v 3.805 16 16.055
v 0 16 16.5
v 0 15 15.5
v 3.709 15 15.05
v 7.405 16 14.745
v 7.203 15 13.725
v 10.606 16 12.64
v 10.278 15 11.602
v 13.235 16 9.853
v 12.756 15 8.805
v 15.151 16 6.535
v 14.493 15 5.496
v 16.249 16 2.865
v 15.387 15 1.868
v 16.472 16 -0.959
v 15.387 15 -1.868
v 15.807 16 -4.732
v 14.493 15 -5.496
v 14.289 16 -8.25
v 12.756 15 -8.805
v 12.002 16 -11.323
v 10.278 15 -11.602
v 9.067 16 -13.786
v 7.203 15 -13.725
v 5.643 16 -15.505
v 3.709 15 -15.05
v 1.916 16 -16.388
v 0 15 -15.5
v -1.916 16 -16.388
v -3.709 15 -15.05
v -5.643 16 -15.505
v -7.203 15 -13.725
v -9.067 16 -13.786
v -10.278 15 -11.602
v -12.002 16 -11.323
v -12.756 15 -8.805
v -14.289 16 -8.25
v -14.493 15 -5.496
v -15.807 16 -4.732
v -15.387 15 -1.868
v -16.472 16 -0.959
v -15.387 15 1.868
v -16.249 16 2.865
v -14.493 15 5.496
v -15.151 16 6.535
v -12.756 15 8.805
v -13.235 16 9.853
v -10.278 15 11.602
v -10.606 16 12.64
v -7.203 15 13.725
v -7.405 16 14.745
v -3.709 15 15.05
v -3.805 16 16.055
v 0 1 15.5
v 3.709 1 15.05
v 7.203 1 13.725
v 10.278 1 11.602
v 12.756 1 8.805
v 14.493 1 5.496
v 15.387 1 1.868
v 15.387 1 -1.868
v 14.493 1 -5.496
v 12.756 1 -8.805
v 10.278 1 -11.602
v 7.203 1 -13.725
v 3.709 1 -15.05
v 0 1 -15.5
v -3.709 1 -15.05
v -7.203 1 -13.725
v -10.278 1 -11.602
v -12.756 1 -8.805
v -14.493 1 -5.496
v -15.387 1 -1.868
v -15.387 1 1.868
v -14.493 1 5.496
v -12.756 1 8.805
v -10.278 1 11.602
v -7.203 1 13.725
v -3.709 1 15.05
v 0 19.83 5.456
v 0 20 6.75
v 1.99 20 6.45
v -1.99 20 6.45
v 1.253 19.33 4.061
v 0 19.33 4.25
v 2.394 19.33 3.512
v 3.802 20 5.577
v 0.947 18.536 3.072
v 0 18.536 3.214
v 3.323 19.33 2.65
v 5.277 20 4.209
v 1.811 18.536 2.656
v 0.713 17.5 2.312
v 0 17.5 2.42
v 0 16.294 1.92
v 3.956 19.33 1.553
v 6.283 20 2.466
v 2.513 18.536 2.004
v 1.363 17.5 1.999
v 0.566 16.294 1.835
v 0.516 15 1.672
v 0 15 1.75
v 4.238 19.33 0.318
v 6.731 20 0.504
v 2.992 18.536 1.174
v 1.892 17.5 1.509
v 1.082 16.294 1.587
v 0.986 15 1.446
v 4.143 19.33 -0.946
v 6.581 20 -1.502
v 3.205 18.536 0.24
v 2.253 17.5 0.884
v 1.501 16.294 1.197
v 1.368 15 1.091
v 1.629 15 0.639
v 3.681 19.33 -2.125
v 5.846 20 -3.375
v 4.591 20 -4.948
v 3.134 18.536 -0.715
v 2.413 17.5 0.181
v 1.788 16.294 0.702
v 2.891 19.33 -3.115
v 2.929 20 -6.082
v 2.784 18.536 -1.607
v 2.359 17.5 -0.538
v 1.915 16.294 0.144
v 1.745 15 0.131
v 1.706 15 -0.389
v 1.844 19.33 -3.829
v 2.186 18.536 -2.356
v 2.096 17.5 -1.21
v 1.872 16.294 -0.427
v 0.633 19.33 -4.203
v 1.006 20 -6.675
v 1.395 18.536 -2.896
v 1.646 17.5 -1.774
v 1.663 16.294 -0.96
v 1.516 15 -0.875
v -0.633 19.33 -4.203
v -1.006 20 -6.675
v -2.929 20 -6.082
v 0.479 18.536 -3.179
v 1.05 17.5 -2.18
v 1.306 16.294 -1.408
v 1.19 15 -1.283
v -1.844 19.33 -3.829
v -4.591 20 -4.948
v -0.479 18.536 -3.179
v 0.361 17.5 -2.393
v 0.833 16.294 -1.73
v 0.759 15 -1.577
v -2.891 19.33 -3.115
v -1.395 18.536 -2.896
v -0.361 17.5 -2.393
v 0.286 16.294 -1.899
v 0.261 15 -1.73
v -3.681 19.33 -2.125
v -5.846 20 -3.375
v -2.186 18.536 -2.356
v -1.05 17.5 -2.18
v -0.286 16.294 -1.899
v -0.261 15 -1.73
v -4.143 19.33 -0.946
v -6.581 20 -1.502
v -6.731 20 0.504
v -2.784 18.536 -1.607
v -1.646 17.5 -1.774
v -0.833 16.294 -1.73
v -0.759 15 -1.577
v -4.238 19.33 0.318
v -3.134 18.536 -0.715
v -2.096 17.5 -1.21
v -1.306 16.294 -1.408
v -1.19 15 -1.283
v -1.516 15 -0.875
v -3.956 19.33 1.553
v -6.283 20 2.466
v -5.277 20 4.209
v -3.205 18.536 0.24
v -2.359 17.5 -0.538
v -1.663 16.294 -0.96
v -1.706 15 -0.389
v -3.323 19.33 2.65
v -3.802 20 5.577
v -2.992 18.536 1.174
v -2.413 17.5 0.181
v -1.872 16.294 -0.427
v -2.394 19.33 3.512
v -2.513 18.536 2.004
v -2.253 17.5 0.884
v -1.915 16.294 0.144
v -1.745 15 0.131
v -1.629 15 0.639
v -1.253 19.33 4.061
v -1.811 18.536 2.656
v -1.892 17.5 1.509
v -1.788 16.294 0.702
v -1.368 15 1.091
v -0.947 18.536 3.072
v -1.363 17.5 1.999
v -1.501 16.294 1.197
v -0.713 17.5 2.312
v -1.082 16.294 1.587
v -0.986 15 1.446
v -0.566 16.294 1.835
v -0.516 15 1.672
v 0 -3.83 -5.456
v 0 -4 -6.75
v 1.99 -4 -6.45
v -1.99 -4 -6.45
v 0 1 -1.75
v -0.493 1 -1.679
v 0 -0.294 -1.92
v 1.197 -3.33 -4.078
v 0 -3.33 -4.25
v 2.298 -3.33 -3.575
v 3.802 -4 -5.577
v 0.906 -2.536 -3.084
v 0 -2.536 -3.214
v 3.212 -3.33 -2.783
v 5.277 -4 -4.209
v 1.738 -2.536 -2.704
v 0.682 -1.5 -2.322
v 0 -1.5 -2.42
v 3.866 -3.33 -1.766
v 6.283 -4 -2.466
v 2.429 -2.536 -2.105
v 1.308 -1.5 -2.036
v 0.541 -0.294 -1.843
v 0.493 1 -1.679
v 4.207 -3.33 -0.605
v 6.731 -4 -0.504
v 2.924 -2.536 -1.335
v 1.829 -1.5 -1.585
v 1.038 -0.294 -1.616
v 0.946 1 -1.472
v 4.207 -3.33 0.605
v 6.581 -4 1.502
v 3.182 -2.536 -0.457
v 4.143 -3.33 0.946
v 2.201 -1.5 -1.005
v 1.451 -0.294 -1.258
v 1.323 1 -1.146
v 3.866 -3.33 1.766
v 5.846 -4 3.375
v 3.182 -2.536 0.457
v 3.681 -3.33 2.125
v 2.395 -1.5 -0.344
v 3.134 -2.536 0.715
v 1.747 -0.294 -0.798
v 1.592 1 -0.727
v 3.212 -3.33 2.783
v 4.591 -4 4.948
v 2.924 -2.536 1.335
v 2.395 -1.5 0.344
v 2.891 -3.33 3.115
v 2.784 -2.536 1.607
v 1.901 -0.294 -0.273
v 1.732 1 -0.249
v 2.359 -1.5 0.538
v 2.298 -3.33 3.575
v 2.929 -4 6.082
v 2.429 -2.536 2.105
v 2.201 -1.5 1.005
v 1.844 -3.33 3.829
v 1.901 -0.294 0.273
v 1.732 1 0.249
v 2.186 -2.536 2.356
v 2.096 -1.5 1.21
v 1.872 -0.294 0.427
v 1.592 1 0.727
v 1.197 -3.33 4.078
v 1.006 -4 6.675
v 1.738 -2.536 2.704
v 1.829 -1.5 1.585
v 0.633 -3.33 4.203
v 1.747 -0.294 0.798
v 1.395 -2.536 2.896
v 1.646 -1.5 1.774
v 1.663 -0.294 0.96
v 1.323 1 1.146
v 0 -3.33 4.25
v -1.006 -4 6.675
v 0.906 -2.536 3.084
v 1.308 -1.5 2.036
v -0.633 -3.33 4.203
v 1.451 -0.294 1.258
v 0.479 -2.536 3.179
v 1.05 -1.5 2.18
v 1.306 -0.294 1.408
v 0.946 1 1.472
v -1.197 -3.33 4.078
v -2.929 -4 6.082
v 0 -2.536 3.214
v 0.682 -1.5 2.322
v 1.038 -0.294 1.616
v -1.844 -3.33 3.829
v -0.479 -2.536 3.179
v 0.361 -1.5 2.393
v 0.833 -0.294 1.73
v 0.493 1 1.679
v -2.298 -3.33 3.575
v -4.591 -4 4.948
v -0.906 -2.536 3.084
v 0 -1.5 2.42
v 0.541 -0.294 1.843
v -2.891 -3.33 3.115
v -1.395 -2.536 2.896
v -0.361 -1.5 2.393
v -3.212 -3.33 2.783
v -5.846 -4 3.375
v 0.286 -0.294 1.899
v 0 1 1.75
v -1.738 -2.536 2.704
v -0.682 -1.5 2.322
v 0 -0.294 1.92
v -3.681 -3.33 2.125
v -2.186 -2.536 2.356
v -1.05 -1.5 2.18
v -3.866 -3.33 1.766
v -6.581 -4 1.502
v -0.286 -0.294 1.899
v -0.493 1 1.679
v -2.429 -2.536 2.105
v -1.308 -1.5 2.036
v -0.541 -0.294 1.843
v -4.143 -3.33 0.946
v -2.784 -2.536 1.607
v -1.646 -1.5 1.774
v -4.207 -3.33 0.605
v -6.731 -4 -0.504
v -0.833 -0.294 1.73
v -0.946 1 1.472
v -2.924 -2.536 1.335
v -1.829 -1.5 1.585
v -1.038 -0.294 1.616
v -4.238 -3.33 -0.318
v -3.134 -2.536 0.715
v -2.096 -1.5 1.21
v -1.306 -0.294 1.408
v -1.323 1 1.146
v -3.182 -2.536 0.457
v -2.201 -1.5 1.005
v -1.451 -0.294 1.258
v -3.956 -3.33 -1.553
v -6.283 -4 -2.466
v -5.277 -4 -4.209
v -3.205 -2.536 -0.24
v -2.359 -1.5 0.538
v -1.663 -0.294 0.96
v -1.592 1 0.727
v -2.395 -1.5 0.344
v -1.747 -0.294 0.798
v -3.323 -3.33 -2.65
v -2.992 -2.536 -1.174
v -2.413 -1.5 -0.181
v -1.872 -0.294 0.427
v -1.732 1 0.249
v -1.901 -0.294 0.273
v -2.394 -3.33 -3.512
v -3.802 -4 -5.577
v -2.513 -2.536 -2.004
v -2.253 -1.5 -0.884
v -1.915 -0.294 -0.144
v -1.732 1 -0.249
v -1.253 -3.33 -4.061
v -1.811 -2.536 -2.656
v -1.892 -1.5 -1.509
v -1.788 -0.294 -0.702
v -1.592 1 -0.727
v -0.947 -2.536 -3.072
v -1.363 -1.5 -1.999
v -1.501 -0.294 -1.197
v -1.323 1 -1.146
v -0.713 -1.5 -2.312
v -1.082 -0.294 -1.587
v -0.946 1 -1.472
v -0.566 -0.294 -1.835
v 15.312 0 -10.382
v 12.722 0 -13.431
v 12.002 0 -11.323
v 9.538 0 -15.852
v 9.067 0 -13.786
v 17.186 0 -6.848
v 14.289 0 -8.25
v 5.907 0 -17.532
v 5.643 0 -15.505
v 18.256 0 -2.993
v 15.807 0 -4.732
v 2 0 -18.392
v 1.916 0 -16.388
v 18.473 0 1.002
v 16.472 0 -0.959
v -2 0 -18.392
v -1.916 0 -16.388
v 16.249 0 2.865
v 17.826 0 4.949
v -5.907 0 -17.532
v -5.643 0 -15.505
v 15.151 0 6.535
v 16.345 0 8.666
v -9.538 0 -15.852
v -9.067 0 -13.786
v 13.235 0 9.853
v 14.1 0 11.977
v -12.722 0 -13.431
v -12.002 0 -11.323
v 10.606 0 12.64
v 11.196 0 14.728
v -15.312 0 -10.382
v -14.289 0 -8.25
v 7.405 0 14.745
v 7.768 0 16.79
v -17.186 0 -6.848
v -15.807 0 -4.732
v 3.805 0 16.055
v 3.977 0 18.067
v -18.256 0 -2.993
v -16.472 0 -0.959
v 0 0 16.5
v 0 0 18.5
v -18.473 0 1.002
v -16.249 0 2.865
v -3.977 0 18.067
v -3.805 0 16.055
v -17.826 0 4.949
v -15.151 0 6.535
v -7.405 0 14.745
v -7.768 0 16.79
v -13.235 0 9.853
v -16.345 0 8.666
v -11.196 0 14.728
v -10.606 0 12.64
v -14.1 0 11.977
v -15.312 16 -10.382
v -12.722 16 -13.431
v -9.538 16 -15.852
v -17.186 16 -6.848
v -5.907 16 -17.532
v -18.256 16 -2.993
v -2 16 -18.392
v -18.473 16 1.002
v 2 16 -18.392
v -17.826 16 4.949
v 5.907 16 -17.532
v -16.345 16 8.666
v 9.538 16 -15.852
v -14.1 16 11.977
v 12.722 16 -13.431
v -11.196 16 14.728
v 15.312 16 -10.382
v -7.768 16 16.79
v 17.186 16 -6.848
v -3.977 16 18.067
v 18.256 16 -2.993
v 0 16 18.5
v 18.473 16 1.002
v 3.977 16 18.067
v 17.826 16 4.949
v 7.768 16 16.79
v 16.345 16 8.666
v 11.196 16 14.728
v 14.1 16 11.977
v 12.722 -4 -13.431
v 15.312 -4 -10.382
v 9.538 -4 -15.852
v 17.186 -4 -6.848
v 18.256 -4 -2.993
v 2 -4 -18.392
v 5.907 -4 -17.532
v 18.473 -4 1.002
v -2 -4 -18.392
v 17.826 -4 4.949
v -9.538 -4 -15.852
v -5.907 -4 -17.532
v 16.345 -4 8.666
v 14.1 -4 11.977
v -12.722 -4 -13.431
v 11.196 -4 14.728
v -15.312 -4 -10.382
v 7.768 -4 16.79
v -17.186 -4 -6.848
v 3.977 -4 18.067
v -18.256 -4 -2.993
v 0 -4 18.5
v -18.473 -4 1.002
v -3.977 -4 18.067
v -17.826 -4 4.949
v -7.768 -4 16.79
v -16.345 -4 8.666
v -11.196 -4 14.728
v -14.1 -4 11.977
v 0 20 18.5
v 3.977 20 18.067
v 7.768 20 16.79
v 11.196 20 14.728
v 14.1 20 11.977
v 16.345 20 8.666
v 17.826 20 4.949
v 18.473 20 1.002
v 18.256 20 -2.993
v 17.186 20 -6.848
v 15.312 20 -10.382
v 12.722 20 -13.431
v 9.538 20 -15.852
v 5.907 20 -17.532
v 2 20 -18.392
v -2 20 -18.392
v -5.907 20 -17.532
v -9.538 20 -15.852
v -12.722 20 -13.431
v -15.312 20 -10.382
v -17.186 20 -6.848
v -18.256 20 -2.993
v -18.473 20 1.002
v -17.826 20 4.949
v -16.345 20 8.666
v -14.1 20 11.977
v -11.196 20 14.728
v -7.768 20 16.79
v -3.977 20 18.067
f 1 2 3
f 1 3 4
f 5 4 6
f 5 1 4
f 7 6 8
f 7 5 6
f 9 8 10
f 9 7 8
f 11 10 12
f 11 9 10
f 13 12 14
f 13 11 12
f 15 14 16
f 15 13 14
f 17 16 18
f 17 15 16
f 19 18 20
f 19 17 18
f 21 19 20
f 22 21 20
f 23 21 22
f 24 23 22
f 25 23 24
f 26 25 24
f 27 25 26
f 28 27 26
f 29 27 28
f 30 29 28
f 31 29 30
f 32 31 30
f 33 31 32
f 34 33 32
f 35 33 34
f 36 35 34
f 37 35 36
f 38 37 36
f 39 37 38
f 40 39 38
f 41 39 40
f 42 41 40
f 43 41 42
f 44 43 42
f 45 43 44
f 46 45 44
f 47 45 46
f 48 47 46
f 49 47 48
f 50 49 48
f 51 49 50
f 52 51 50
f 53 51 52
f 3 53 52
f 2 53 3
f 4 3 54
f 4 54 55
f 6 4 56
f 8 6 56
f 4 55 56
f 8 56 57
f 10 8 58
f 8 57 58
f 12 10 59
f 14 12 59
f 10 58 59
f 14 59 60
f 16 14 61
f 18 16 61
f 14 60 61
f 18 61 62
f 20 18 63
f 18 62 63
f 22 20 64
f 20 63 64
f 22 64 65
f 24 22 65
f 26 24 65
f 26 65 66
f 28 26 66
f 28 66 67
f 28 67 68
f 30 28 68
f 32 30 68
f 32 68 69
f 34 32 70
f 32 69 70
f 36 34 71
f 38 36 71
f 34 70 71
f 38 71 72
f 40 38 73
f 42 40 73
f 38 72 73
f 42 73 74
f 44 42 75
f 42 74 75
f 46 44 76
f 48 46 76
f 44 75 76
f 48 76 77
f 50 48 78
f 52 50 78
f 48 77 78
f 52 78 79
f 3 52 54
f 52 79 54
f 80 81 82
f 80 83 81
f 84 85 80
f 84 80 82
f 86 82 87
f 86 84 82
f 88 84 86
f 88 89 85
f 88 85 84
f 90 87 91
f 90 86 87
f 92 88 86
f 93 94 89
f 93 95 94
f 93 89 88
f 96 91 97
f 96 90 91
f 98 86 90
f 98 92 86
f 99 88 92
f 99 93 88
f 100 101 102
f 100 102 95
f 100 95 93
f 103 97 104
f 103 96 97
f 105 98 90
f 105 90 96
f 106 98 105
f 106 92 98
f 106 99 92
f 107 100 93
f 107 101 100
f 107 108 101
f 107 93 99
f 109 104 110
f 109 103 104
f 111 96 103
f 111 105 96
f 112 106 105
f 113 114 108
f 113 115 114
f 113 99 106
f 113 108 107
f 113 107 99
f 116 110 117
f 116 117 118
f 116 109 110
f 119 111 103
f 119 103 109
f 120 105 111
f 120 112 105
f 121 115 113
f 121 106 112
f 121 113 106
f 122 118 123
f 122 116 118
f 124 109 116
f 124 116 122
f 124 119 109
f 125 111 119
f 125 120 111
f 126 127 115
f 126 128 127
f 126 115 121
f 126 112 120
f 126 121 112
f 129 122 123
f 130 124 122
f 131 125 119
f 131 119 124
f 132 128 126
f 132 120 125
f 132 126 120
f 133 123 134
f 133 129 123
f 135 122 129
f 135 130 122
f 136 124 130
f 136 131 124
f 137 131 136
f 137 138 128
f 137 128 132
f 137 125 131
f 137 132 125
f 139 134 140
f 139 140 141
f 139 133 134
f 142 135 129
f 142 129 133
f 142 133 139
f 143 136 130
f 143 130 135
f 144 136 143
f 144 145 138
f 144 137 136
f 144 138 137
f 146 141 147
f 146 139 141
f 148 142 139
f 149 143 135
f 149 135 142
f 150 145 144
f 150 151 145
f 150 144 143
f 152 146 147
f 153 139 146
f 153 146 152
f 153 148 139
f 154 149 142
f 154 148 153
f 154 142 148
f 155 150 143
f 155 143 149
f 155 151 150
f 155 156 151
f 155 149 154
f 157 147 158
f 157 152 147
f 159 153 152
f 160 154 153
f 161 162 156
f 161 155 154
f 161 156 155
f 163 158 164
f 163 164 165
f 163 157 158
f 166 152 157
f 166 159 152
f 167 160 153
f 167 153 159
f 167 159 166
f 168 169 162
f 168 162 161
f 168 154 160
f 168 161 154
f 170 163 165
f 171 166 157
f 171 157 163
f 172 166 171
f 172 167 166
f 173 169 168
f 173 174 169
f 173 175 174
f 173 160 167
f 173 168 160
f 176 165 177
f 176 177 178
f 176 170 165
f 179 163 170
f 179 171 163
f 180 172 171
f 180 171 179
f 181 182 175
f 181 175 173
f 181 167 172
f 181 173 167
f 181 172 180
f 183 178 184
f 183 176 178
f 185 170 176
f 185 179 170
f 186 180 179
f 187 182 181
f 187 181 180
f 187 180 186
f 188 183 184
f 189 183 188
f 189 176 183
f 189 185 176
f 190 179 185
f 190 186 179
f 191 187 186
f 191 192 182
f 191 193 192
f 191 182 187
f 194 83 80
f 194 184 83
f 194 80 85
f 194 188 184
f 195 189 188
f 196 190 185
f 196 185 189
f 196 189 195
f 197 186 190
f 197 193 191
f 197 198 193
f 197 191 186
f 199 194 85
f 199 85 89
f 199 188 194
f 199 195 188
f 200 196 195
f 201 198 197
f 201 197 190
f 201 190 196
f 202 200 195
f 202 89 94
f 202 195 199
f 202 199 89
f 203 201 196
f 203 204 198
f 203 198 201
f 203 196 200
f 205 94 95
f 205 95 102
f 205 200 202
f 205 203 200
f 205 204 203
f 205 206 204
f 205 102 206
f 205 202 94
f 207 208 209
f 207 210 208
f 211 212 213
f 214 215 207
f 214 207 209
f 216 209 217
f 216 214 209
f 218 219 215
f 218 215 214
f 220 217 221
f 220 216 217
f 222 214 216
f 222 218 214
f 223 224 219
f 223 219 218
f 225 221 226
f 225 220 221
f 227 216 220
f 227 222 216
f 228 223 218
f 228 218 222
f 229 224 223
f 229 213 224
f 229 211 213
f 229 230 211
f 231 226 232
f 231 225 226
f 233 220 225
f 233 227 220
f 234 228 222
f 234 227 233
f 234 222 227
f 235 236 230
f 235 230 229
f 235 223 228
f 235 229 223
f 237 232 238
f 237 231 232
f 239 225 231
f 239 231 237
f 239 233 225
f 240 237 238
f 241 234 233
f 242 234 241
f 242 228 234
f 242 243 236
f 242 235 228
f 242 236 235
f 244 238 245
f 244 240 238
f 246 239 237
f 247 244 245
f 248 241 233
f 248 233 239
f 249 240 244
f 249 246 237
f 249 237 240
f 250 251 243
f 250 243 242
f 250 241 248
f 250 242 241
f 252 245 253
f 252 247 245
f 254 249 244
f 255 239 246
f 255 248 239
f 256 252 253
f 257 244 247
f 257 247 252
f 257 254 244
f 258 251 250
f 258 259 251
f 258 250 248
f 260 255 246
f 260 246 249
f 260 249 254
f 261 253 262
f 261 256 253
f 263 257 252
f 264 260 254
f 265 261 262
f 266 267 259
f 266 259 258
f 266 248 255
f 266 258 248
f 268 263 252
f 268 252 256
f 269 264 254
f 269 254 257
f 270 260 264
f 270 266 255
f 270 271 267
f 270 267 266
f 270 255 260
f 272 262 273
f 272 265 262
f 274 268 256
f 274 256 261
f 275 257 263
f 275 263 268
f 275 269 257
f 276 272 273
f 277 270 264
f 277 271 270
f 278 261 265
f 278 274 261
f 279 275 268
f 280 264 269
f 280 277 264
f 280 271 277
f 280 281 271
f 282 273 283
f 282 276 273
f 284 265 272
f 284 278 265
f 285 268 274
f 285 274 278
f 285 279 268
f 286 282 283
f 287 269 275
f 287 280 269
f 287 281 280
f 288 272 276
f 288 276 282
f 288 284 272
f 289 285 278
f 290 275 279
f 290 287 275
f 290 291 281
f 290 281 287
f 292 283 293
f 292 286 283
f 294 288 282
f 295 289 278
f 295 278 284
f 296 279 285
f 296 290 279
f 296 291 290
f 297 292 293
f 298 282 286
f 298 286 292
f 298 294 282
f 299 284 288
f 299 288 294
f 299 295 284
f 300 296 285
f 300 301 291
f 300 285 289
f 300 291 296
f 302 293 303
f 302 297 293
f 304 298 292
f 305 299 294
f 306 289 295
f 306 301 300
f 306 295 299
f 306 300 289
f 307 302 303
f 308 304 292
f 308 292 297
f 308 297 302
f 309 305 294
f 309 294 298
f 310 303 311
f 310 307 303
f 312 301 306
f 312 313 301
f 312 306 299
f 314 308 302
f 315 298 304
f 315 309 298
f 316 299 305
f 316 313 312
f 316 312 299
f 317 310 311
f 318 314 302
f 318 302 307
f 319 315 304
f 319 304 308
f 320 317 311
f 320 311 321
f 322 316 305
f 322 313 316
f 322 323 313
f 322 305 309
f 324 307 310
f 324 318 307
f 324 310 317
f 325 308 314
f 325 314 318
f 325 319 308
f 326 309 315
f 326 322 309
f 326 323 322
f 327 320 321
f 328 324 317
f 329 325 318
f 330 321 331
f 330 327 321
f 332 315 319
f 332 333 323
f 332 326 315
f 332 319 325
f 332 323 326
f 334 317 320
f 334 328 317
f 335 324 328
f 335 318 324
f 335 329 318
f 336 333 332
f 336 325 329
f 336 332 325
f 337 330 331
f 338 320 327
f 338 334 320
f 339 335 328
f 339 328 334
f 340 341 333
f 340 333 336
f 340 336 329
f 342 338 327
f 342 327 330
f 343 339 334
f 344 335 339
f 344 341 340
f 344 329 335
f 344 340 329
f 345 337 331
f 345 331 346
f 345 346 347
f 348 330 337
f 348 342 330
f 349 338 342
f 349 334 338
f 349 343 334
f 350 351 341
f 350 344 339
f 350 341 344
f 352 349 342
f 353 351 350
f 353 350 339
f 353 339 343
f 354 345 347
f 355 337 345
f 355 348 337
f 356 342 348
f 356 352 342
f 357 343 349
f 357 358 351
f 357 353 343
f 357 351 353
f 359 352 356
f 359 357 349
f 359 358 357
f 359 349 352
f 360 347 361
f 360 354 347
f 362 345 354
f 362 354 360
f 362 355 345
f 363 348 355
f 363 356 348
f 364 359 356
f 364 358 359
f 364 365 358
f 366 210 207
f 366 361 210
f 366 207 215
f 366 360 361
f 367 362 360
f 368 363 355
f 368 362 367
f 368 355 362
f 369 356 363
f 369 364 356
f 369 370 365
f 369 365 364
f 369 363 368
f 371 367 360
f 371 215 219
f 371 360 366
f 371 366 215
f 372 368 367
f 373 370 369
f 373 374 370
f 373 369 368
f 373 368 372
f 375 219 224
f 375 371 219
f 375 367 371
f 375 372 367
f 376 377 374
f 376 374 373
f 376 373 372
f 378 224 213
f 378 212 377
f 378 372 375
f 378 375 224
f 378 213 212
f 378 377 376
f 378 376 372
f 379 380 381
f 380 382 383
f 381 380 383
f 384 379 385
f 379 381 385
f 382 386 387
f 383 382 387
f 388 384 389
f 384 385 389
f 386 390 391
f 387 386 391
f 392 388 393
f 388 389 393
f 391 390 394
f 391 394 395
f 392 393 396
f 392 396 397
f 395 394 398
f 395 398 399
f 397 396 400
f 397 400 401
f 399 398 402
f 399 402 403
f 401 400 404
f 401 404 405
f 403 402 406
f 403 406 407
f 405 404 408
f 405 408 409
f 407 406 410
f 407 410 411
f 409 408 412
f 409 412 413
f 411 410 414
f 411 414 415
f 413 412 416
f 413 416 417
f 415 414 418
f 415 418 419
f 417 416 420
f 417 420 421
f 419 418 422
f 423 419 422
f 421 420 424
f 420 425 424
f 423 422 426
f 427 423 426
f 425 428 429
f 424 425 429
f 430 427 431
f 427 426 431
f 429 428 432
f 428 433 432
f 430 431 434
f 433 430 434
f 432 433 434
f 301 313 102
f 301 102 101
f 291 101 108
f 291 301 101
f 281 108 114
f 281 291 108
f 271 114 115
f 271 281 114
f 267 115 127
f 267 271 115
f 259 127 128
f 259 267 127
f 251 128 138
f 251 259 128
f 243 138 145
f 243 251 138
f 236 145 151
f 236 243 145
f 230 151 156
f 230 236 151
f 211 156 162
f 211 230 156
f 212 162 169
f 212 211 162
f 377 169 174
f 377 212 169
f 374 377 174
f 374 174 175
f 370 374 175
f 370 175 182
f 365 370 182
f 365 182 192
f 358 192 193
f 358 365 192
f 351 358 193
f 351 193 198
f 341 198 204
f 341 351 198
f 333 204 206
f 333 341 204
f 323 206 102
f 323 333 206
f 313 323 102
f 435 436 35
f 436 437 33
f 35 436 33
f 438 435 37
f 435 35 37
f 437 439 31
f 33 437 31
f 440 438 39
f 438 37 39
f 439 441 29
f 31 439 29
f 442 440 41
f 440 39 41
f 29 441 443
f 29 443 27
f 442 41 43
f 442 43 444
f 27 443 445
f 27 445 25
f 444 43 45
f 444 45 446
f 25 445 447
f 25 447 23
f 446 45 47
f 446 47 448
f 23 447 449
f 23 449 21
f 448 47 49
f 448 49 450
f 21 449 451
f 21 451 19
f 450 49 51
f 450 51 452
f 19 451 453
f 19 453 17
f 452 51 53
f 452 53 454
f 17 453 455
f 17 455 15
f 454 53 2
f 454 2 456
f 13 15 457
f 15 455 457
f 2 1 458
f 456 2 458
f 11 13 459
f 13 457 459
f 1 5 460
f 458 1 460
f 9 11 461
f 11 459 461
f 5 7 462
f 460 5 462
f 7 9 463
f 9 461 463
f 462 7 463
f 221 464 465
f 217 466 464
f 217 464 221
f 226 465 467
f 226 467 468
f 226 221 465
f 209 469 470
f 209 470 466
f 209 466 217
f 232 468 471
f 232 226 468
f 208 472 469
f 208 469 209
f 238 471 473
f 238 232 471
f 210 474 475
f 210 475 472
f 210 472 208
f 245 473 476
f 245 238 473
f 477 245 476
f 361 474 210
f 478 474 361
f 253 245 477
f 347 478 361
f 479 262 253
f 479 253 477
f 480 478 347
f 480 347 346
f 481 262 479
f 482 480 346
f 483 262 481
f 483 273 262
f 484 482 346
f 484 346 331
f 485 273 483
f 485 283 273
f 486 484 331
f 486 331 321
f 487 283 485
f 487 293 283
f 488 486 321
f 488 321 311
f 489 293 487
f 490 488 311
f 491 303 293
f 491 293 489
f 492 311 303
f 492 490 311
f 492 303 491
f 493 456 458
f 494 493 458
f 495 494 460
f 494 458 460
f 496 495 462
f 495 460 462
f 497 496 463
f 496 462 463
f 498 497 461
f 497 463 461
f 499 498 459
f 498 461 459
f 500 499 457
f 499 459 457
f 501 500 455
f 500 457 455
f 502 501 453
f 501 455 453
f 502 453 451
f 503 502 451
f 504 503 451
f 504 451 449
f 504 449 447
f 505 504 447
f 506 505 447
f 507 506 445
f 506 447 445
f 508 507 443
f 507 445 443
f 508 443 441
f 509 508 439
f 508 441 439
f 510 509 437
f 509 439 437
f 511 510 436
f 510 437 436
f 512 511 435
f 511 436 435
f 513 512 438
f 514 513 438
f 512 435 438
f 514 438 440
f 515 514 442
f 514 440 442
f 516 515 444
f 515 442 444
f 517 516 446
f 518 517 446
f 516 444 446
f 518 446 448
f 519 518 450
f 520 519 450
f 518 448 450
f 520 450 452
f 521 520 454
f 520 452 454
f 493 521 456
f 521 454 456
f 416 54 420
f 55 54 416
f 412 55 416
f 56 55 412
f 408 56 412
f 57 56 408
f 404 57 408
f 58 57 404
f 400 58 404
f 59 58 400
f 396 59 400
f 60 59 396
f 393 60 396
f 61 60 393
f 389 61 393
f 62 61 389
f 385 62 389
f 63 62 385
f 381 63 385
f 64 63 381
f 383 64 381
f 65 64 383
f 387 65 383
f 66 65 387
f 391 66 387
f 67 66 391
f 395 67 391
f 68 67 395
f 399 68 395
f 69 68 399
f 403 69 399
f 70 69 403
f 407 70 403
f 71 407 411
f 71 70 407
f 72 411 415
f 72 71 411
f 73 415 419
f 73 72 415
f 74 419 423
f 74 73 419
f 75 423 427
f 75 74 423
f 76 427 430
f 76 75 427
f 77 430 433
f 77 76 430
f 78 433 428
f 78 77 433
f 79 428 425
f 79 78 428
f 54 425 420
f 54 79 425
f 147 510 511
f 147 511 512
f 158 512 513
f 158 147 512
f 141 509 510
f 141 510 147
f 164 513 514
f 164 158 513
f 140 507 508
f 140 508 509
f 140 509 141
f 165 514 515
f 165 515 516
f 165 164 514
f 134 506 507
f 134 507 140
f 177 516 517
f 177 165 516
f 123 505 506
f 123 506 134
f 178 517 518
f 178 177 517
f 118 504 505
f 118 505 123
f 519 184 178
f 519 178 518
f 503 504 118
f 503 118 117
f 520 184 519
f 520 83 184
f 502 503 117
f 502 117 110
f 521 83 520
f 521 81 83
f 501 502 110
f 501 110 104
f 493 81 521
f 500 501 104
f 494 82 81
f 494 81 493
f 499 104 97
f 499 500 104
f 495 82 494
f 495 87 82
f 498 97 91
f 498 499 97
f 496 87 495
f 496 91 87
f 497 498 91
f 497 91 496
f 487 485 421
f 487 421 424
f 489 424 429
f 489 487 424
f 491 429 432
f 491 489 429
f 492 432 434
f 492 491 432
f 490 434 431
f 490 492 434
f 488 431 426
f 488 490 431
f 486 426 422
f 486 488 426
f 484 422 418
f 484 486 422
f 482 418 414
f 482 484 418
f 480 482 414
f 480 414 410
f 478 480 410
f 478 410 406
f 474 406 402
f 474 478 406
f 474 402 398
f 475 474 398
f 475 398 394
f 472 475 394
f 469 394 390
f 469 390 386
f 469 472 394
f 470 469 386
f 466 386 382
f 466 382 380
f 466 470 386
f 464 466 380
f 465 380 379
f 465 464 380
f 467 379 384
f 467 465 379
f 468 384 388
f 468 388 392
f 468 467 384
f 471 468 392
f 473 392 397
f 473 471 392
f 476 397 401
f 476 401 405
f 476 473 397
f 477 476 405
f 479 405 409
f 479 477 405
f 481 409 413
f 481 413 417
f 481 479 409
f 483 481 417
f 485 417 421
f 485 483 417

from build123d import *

# Parameters (mm, degrees)
SKETCH1_R           = 15.5
SKETCH1_R_2         = 1.75
BOSS_EXTRUDE1_DEPTH = 16
SKETCH2_R           = 18.5
SKETCH2_R_2         = 1.75
BOSS_EXTRUDE2_DEPTH = 4
BOSS_EXTRUDE3_START = 4
SKETCH3_R           = 18.5
SKETCH3_R_2         = 1.75
BOSS_EXTRUDE3_DEPTH = 4
FILLET1_R           = 5
CHAMFER1_SIZE       = 1


with BuildPart() as part:
    # Sketch1 → Boss-Extrude1 (new body)
    with BuildSketch(Plane(origin=(0, 0, 0), x_dir=(1, 0, 0), z_dir=(0, 1, 0))):
        with Locations(Location((0, 0, 0), (0, 0, 270))):
            Circle(SKETCH1_R)
        with Locations(Location((0, 0, 0), (0, 0, 270))):
            Circle(SKETCH1_R_2, mode=Mode.SUBTRACT)
    extrude(amount=BOSS_EXTRUDE1_DEPTH)

    # Sketch2 → Boss-Extrude2 (add)
    with BuildSketch(Plane(origin=(0, 16, 0), x_dir=(1, 0, 0), z_dir=(0, 1, 0))):
        with Locations(Location((0, 0, 0), (0, 0, 270))):
            Circle(SKETCH2_R)
        with Locations(Location((0, 0, 0), (0, 0, 270))):
            Circle(SKETCH2_R_2, mode=Mode.SUBTRACT)
    extrude(amount=BOSS_EXTRUDE2_DEPTH)

    # Sketch3 → Boss-Extrude3 (add)
    with BuildSketch(Plane.XZ.offset(BOSS_EXTRUDE3_START)):
        with Locations(Location((0, 0, 0), (0, 0, 90))):
            Circle(SKETCH3_R)
        with Locations(Location((0, 0, 0), (0, 0, 270))):
            Circle(SKETCH3_R_2, mode=Mode.SUBTRACT)
    extrude(amount=-BOSS_EXTRUDE3_DEPTH)

    # Fillet1
    # the kernel refuses this fillet: 5 mm, written as the material it takes off along each edge
    with BuildSketch(Plane(origin=(0, 20, 0), x_dir=(0, 0, 1), z_dir=(-1, 0, 0))) as fillet1_piece_1:
        with BuildLine():
            CenterArc((1.75 + FILLET1_R, -FILLET1_R), FILLET1_R, 90, 90)
            Line((1.75, -FILLET1_R), (1.75, 0))
            Line((1.75, 0), (1.75 + FILLET1_R, 0))
        make_face()
    revolve(axis=Axis((0, 20, 0), (0, 1, 0)), mode=Mode.SUBTRACT)
    with BuildSketch(Plane(origin=(0, -4, 0), x_dir=(0, 0, -1), z_dir=(-1, 0, 0))) as fillet1_piece_2:
        with BuildLine():
            CenterArc((1.75 + FILLET1_R, -FILLET1_R), FILLET1_R, 90, 90)
            Line((1.75, -FILLET1_R), (1.75, 0))
            Line((1.75, 0), (1.75 + FILLET1_R, 0))
        make_face()
    revolve(axis=Axis((0, -4, 0), (0, -1, 0)), mode=Mode.SUBTRACT)

    # Chamfer1
    chamfer1_edges = [part.edges().sort_by_distance(p)[0] for p in [
        (0, 0, -15.5),
        (0, 16, -15.5),
    ]]
    chamfer(chamfer1_edges, length=CHAMFER1_SIZE)


solid = part.part
